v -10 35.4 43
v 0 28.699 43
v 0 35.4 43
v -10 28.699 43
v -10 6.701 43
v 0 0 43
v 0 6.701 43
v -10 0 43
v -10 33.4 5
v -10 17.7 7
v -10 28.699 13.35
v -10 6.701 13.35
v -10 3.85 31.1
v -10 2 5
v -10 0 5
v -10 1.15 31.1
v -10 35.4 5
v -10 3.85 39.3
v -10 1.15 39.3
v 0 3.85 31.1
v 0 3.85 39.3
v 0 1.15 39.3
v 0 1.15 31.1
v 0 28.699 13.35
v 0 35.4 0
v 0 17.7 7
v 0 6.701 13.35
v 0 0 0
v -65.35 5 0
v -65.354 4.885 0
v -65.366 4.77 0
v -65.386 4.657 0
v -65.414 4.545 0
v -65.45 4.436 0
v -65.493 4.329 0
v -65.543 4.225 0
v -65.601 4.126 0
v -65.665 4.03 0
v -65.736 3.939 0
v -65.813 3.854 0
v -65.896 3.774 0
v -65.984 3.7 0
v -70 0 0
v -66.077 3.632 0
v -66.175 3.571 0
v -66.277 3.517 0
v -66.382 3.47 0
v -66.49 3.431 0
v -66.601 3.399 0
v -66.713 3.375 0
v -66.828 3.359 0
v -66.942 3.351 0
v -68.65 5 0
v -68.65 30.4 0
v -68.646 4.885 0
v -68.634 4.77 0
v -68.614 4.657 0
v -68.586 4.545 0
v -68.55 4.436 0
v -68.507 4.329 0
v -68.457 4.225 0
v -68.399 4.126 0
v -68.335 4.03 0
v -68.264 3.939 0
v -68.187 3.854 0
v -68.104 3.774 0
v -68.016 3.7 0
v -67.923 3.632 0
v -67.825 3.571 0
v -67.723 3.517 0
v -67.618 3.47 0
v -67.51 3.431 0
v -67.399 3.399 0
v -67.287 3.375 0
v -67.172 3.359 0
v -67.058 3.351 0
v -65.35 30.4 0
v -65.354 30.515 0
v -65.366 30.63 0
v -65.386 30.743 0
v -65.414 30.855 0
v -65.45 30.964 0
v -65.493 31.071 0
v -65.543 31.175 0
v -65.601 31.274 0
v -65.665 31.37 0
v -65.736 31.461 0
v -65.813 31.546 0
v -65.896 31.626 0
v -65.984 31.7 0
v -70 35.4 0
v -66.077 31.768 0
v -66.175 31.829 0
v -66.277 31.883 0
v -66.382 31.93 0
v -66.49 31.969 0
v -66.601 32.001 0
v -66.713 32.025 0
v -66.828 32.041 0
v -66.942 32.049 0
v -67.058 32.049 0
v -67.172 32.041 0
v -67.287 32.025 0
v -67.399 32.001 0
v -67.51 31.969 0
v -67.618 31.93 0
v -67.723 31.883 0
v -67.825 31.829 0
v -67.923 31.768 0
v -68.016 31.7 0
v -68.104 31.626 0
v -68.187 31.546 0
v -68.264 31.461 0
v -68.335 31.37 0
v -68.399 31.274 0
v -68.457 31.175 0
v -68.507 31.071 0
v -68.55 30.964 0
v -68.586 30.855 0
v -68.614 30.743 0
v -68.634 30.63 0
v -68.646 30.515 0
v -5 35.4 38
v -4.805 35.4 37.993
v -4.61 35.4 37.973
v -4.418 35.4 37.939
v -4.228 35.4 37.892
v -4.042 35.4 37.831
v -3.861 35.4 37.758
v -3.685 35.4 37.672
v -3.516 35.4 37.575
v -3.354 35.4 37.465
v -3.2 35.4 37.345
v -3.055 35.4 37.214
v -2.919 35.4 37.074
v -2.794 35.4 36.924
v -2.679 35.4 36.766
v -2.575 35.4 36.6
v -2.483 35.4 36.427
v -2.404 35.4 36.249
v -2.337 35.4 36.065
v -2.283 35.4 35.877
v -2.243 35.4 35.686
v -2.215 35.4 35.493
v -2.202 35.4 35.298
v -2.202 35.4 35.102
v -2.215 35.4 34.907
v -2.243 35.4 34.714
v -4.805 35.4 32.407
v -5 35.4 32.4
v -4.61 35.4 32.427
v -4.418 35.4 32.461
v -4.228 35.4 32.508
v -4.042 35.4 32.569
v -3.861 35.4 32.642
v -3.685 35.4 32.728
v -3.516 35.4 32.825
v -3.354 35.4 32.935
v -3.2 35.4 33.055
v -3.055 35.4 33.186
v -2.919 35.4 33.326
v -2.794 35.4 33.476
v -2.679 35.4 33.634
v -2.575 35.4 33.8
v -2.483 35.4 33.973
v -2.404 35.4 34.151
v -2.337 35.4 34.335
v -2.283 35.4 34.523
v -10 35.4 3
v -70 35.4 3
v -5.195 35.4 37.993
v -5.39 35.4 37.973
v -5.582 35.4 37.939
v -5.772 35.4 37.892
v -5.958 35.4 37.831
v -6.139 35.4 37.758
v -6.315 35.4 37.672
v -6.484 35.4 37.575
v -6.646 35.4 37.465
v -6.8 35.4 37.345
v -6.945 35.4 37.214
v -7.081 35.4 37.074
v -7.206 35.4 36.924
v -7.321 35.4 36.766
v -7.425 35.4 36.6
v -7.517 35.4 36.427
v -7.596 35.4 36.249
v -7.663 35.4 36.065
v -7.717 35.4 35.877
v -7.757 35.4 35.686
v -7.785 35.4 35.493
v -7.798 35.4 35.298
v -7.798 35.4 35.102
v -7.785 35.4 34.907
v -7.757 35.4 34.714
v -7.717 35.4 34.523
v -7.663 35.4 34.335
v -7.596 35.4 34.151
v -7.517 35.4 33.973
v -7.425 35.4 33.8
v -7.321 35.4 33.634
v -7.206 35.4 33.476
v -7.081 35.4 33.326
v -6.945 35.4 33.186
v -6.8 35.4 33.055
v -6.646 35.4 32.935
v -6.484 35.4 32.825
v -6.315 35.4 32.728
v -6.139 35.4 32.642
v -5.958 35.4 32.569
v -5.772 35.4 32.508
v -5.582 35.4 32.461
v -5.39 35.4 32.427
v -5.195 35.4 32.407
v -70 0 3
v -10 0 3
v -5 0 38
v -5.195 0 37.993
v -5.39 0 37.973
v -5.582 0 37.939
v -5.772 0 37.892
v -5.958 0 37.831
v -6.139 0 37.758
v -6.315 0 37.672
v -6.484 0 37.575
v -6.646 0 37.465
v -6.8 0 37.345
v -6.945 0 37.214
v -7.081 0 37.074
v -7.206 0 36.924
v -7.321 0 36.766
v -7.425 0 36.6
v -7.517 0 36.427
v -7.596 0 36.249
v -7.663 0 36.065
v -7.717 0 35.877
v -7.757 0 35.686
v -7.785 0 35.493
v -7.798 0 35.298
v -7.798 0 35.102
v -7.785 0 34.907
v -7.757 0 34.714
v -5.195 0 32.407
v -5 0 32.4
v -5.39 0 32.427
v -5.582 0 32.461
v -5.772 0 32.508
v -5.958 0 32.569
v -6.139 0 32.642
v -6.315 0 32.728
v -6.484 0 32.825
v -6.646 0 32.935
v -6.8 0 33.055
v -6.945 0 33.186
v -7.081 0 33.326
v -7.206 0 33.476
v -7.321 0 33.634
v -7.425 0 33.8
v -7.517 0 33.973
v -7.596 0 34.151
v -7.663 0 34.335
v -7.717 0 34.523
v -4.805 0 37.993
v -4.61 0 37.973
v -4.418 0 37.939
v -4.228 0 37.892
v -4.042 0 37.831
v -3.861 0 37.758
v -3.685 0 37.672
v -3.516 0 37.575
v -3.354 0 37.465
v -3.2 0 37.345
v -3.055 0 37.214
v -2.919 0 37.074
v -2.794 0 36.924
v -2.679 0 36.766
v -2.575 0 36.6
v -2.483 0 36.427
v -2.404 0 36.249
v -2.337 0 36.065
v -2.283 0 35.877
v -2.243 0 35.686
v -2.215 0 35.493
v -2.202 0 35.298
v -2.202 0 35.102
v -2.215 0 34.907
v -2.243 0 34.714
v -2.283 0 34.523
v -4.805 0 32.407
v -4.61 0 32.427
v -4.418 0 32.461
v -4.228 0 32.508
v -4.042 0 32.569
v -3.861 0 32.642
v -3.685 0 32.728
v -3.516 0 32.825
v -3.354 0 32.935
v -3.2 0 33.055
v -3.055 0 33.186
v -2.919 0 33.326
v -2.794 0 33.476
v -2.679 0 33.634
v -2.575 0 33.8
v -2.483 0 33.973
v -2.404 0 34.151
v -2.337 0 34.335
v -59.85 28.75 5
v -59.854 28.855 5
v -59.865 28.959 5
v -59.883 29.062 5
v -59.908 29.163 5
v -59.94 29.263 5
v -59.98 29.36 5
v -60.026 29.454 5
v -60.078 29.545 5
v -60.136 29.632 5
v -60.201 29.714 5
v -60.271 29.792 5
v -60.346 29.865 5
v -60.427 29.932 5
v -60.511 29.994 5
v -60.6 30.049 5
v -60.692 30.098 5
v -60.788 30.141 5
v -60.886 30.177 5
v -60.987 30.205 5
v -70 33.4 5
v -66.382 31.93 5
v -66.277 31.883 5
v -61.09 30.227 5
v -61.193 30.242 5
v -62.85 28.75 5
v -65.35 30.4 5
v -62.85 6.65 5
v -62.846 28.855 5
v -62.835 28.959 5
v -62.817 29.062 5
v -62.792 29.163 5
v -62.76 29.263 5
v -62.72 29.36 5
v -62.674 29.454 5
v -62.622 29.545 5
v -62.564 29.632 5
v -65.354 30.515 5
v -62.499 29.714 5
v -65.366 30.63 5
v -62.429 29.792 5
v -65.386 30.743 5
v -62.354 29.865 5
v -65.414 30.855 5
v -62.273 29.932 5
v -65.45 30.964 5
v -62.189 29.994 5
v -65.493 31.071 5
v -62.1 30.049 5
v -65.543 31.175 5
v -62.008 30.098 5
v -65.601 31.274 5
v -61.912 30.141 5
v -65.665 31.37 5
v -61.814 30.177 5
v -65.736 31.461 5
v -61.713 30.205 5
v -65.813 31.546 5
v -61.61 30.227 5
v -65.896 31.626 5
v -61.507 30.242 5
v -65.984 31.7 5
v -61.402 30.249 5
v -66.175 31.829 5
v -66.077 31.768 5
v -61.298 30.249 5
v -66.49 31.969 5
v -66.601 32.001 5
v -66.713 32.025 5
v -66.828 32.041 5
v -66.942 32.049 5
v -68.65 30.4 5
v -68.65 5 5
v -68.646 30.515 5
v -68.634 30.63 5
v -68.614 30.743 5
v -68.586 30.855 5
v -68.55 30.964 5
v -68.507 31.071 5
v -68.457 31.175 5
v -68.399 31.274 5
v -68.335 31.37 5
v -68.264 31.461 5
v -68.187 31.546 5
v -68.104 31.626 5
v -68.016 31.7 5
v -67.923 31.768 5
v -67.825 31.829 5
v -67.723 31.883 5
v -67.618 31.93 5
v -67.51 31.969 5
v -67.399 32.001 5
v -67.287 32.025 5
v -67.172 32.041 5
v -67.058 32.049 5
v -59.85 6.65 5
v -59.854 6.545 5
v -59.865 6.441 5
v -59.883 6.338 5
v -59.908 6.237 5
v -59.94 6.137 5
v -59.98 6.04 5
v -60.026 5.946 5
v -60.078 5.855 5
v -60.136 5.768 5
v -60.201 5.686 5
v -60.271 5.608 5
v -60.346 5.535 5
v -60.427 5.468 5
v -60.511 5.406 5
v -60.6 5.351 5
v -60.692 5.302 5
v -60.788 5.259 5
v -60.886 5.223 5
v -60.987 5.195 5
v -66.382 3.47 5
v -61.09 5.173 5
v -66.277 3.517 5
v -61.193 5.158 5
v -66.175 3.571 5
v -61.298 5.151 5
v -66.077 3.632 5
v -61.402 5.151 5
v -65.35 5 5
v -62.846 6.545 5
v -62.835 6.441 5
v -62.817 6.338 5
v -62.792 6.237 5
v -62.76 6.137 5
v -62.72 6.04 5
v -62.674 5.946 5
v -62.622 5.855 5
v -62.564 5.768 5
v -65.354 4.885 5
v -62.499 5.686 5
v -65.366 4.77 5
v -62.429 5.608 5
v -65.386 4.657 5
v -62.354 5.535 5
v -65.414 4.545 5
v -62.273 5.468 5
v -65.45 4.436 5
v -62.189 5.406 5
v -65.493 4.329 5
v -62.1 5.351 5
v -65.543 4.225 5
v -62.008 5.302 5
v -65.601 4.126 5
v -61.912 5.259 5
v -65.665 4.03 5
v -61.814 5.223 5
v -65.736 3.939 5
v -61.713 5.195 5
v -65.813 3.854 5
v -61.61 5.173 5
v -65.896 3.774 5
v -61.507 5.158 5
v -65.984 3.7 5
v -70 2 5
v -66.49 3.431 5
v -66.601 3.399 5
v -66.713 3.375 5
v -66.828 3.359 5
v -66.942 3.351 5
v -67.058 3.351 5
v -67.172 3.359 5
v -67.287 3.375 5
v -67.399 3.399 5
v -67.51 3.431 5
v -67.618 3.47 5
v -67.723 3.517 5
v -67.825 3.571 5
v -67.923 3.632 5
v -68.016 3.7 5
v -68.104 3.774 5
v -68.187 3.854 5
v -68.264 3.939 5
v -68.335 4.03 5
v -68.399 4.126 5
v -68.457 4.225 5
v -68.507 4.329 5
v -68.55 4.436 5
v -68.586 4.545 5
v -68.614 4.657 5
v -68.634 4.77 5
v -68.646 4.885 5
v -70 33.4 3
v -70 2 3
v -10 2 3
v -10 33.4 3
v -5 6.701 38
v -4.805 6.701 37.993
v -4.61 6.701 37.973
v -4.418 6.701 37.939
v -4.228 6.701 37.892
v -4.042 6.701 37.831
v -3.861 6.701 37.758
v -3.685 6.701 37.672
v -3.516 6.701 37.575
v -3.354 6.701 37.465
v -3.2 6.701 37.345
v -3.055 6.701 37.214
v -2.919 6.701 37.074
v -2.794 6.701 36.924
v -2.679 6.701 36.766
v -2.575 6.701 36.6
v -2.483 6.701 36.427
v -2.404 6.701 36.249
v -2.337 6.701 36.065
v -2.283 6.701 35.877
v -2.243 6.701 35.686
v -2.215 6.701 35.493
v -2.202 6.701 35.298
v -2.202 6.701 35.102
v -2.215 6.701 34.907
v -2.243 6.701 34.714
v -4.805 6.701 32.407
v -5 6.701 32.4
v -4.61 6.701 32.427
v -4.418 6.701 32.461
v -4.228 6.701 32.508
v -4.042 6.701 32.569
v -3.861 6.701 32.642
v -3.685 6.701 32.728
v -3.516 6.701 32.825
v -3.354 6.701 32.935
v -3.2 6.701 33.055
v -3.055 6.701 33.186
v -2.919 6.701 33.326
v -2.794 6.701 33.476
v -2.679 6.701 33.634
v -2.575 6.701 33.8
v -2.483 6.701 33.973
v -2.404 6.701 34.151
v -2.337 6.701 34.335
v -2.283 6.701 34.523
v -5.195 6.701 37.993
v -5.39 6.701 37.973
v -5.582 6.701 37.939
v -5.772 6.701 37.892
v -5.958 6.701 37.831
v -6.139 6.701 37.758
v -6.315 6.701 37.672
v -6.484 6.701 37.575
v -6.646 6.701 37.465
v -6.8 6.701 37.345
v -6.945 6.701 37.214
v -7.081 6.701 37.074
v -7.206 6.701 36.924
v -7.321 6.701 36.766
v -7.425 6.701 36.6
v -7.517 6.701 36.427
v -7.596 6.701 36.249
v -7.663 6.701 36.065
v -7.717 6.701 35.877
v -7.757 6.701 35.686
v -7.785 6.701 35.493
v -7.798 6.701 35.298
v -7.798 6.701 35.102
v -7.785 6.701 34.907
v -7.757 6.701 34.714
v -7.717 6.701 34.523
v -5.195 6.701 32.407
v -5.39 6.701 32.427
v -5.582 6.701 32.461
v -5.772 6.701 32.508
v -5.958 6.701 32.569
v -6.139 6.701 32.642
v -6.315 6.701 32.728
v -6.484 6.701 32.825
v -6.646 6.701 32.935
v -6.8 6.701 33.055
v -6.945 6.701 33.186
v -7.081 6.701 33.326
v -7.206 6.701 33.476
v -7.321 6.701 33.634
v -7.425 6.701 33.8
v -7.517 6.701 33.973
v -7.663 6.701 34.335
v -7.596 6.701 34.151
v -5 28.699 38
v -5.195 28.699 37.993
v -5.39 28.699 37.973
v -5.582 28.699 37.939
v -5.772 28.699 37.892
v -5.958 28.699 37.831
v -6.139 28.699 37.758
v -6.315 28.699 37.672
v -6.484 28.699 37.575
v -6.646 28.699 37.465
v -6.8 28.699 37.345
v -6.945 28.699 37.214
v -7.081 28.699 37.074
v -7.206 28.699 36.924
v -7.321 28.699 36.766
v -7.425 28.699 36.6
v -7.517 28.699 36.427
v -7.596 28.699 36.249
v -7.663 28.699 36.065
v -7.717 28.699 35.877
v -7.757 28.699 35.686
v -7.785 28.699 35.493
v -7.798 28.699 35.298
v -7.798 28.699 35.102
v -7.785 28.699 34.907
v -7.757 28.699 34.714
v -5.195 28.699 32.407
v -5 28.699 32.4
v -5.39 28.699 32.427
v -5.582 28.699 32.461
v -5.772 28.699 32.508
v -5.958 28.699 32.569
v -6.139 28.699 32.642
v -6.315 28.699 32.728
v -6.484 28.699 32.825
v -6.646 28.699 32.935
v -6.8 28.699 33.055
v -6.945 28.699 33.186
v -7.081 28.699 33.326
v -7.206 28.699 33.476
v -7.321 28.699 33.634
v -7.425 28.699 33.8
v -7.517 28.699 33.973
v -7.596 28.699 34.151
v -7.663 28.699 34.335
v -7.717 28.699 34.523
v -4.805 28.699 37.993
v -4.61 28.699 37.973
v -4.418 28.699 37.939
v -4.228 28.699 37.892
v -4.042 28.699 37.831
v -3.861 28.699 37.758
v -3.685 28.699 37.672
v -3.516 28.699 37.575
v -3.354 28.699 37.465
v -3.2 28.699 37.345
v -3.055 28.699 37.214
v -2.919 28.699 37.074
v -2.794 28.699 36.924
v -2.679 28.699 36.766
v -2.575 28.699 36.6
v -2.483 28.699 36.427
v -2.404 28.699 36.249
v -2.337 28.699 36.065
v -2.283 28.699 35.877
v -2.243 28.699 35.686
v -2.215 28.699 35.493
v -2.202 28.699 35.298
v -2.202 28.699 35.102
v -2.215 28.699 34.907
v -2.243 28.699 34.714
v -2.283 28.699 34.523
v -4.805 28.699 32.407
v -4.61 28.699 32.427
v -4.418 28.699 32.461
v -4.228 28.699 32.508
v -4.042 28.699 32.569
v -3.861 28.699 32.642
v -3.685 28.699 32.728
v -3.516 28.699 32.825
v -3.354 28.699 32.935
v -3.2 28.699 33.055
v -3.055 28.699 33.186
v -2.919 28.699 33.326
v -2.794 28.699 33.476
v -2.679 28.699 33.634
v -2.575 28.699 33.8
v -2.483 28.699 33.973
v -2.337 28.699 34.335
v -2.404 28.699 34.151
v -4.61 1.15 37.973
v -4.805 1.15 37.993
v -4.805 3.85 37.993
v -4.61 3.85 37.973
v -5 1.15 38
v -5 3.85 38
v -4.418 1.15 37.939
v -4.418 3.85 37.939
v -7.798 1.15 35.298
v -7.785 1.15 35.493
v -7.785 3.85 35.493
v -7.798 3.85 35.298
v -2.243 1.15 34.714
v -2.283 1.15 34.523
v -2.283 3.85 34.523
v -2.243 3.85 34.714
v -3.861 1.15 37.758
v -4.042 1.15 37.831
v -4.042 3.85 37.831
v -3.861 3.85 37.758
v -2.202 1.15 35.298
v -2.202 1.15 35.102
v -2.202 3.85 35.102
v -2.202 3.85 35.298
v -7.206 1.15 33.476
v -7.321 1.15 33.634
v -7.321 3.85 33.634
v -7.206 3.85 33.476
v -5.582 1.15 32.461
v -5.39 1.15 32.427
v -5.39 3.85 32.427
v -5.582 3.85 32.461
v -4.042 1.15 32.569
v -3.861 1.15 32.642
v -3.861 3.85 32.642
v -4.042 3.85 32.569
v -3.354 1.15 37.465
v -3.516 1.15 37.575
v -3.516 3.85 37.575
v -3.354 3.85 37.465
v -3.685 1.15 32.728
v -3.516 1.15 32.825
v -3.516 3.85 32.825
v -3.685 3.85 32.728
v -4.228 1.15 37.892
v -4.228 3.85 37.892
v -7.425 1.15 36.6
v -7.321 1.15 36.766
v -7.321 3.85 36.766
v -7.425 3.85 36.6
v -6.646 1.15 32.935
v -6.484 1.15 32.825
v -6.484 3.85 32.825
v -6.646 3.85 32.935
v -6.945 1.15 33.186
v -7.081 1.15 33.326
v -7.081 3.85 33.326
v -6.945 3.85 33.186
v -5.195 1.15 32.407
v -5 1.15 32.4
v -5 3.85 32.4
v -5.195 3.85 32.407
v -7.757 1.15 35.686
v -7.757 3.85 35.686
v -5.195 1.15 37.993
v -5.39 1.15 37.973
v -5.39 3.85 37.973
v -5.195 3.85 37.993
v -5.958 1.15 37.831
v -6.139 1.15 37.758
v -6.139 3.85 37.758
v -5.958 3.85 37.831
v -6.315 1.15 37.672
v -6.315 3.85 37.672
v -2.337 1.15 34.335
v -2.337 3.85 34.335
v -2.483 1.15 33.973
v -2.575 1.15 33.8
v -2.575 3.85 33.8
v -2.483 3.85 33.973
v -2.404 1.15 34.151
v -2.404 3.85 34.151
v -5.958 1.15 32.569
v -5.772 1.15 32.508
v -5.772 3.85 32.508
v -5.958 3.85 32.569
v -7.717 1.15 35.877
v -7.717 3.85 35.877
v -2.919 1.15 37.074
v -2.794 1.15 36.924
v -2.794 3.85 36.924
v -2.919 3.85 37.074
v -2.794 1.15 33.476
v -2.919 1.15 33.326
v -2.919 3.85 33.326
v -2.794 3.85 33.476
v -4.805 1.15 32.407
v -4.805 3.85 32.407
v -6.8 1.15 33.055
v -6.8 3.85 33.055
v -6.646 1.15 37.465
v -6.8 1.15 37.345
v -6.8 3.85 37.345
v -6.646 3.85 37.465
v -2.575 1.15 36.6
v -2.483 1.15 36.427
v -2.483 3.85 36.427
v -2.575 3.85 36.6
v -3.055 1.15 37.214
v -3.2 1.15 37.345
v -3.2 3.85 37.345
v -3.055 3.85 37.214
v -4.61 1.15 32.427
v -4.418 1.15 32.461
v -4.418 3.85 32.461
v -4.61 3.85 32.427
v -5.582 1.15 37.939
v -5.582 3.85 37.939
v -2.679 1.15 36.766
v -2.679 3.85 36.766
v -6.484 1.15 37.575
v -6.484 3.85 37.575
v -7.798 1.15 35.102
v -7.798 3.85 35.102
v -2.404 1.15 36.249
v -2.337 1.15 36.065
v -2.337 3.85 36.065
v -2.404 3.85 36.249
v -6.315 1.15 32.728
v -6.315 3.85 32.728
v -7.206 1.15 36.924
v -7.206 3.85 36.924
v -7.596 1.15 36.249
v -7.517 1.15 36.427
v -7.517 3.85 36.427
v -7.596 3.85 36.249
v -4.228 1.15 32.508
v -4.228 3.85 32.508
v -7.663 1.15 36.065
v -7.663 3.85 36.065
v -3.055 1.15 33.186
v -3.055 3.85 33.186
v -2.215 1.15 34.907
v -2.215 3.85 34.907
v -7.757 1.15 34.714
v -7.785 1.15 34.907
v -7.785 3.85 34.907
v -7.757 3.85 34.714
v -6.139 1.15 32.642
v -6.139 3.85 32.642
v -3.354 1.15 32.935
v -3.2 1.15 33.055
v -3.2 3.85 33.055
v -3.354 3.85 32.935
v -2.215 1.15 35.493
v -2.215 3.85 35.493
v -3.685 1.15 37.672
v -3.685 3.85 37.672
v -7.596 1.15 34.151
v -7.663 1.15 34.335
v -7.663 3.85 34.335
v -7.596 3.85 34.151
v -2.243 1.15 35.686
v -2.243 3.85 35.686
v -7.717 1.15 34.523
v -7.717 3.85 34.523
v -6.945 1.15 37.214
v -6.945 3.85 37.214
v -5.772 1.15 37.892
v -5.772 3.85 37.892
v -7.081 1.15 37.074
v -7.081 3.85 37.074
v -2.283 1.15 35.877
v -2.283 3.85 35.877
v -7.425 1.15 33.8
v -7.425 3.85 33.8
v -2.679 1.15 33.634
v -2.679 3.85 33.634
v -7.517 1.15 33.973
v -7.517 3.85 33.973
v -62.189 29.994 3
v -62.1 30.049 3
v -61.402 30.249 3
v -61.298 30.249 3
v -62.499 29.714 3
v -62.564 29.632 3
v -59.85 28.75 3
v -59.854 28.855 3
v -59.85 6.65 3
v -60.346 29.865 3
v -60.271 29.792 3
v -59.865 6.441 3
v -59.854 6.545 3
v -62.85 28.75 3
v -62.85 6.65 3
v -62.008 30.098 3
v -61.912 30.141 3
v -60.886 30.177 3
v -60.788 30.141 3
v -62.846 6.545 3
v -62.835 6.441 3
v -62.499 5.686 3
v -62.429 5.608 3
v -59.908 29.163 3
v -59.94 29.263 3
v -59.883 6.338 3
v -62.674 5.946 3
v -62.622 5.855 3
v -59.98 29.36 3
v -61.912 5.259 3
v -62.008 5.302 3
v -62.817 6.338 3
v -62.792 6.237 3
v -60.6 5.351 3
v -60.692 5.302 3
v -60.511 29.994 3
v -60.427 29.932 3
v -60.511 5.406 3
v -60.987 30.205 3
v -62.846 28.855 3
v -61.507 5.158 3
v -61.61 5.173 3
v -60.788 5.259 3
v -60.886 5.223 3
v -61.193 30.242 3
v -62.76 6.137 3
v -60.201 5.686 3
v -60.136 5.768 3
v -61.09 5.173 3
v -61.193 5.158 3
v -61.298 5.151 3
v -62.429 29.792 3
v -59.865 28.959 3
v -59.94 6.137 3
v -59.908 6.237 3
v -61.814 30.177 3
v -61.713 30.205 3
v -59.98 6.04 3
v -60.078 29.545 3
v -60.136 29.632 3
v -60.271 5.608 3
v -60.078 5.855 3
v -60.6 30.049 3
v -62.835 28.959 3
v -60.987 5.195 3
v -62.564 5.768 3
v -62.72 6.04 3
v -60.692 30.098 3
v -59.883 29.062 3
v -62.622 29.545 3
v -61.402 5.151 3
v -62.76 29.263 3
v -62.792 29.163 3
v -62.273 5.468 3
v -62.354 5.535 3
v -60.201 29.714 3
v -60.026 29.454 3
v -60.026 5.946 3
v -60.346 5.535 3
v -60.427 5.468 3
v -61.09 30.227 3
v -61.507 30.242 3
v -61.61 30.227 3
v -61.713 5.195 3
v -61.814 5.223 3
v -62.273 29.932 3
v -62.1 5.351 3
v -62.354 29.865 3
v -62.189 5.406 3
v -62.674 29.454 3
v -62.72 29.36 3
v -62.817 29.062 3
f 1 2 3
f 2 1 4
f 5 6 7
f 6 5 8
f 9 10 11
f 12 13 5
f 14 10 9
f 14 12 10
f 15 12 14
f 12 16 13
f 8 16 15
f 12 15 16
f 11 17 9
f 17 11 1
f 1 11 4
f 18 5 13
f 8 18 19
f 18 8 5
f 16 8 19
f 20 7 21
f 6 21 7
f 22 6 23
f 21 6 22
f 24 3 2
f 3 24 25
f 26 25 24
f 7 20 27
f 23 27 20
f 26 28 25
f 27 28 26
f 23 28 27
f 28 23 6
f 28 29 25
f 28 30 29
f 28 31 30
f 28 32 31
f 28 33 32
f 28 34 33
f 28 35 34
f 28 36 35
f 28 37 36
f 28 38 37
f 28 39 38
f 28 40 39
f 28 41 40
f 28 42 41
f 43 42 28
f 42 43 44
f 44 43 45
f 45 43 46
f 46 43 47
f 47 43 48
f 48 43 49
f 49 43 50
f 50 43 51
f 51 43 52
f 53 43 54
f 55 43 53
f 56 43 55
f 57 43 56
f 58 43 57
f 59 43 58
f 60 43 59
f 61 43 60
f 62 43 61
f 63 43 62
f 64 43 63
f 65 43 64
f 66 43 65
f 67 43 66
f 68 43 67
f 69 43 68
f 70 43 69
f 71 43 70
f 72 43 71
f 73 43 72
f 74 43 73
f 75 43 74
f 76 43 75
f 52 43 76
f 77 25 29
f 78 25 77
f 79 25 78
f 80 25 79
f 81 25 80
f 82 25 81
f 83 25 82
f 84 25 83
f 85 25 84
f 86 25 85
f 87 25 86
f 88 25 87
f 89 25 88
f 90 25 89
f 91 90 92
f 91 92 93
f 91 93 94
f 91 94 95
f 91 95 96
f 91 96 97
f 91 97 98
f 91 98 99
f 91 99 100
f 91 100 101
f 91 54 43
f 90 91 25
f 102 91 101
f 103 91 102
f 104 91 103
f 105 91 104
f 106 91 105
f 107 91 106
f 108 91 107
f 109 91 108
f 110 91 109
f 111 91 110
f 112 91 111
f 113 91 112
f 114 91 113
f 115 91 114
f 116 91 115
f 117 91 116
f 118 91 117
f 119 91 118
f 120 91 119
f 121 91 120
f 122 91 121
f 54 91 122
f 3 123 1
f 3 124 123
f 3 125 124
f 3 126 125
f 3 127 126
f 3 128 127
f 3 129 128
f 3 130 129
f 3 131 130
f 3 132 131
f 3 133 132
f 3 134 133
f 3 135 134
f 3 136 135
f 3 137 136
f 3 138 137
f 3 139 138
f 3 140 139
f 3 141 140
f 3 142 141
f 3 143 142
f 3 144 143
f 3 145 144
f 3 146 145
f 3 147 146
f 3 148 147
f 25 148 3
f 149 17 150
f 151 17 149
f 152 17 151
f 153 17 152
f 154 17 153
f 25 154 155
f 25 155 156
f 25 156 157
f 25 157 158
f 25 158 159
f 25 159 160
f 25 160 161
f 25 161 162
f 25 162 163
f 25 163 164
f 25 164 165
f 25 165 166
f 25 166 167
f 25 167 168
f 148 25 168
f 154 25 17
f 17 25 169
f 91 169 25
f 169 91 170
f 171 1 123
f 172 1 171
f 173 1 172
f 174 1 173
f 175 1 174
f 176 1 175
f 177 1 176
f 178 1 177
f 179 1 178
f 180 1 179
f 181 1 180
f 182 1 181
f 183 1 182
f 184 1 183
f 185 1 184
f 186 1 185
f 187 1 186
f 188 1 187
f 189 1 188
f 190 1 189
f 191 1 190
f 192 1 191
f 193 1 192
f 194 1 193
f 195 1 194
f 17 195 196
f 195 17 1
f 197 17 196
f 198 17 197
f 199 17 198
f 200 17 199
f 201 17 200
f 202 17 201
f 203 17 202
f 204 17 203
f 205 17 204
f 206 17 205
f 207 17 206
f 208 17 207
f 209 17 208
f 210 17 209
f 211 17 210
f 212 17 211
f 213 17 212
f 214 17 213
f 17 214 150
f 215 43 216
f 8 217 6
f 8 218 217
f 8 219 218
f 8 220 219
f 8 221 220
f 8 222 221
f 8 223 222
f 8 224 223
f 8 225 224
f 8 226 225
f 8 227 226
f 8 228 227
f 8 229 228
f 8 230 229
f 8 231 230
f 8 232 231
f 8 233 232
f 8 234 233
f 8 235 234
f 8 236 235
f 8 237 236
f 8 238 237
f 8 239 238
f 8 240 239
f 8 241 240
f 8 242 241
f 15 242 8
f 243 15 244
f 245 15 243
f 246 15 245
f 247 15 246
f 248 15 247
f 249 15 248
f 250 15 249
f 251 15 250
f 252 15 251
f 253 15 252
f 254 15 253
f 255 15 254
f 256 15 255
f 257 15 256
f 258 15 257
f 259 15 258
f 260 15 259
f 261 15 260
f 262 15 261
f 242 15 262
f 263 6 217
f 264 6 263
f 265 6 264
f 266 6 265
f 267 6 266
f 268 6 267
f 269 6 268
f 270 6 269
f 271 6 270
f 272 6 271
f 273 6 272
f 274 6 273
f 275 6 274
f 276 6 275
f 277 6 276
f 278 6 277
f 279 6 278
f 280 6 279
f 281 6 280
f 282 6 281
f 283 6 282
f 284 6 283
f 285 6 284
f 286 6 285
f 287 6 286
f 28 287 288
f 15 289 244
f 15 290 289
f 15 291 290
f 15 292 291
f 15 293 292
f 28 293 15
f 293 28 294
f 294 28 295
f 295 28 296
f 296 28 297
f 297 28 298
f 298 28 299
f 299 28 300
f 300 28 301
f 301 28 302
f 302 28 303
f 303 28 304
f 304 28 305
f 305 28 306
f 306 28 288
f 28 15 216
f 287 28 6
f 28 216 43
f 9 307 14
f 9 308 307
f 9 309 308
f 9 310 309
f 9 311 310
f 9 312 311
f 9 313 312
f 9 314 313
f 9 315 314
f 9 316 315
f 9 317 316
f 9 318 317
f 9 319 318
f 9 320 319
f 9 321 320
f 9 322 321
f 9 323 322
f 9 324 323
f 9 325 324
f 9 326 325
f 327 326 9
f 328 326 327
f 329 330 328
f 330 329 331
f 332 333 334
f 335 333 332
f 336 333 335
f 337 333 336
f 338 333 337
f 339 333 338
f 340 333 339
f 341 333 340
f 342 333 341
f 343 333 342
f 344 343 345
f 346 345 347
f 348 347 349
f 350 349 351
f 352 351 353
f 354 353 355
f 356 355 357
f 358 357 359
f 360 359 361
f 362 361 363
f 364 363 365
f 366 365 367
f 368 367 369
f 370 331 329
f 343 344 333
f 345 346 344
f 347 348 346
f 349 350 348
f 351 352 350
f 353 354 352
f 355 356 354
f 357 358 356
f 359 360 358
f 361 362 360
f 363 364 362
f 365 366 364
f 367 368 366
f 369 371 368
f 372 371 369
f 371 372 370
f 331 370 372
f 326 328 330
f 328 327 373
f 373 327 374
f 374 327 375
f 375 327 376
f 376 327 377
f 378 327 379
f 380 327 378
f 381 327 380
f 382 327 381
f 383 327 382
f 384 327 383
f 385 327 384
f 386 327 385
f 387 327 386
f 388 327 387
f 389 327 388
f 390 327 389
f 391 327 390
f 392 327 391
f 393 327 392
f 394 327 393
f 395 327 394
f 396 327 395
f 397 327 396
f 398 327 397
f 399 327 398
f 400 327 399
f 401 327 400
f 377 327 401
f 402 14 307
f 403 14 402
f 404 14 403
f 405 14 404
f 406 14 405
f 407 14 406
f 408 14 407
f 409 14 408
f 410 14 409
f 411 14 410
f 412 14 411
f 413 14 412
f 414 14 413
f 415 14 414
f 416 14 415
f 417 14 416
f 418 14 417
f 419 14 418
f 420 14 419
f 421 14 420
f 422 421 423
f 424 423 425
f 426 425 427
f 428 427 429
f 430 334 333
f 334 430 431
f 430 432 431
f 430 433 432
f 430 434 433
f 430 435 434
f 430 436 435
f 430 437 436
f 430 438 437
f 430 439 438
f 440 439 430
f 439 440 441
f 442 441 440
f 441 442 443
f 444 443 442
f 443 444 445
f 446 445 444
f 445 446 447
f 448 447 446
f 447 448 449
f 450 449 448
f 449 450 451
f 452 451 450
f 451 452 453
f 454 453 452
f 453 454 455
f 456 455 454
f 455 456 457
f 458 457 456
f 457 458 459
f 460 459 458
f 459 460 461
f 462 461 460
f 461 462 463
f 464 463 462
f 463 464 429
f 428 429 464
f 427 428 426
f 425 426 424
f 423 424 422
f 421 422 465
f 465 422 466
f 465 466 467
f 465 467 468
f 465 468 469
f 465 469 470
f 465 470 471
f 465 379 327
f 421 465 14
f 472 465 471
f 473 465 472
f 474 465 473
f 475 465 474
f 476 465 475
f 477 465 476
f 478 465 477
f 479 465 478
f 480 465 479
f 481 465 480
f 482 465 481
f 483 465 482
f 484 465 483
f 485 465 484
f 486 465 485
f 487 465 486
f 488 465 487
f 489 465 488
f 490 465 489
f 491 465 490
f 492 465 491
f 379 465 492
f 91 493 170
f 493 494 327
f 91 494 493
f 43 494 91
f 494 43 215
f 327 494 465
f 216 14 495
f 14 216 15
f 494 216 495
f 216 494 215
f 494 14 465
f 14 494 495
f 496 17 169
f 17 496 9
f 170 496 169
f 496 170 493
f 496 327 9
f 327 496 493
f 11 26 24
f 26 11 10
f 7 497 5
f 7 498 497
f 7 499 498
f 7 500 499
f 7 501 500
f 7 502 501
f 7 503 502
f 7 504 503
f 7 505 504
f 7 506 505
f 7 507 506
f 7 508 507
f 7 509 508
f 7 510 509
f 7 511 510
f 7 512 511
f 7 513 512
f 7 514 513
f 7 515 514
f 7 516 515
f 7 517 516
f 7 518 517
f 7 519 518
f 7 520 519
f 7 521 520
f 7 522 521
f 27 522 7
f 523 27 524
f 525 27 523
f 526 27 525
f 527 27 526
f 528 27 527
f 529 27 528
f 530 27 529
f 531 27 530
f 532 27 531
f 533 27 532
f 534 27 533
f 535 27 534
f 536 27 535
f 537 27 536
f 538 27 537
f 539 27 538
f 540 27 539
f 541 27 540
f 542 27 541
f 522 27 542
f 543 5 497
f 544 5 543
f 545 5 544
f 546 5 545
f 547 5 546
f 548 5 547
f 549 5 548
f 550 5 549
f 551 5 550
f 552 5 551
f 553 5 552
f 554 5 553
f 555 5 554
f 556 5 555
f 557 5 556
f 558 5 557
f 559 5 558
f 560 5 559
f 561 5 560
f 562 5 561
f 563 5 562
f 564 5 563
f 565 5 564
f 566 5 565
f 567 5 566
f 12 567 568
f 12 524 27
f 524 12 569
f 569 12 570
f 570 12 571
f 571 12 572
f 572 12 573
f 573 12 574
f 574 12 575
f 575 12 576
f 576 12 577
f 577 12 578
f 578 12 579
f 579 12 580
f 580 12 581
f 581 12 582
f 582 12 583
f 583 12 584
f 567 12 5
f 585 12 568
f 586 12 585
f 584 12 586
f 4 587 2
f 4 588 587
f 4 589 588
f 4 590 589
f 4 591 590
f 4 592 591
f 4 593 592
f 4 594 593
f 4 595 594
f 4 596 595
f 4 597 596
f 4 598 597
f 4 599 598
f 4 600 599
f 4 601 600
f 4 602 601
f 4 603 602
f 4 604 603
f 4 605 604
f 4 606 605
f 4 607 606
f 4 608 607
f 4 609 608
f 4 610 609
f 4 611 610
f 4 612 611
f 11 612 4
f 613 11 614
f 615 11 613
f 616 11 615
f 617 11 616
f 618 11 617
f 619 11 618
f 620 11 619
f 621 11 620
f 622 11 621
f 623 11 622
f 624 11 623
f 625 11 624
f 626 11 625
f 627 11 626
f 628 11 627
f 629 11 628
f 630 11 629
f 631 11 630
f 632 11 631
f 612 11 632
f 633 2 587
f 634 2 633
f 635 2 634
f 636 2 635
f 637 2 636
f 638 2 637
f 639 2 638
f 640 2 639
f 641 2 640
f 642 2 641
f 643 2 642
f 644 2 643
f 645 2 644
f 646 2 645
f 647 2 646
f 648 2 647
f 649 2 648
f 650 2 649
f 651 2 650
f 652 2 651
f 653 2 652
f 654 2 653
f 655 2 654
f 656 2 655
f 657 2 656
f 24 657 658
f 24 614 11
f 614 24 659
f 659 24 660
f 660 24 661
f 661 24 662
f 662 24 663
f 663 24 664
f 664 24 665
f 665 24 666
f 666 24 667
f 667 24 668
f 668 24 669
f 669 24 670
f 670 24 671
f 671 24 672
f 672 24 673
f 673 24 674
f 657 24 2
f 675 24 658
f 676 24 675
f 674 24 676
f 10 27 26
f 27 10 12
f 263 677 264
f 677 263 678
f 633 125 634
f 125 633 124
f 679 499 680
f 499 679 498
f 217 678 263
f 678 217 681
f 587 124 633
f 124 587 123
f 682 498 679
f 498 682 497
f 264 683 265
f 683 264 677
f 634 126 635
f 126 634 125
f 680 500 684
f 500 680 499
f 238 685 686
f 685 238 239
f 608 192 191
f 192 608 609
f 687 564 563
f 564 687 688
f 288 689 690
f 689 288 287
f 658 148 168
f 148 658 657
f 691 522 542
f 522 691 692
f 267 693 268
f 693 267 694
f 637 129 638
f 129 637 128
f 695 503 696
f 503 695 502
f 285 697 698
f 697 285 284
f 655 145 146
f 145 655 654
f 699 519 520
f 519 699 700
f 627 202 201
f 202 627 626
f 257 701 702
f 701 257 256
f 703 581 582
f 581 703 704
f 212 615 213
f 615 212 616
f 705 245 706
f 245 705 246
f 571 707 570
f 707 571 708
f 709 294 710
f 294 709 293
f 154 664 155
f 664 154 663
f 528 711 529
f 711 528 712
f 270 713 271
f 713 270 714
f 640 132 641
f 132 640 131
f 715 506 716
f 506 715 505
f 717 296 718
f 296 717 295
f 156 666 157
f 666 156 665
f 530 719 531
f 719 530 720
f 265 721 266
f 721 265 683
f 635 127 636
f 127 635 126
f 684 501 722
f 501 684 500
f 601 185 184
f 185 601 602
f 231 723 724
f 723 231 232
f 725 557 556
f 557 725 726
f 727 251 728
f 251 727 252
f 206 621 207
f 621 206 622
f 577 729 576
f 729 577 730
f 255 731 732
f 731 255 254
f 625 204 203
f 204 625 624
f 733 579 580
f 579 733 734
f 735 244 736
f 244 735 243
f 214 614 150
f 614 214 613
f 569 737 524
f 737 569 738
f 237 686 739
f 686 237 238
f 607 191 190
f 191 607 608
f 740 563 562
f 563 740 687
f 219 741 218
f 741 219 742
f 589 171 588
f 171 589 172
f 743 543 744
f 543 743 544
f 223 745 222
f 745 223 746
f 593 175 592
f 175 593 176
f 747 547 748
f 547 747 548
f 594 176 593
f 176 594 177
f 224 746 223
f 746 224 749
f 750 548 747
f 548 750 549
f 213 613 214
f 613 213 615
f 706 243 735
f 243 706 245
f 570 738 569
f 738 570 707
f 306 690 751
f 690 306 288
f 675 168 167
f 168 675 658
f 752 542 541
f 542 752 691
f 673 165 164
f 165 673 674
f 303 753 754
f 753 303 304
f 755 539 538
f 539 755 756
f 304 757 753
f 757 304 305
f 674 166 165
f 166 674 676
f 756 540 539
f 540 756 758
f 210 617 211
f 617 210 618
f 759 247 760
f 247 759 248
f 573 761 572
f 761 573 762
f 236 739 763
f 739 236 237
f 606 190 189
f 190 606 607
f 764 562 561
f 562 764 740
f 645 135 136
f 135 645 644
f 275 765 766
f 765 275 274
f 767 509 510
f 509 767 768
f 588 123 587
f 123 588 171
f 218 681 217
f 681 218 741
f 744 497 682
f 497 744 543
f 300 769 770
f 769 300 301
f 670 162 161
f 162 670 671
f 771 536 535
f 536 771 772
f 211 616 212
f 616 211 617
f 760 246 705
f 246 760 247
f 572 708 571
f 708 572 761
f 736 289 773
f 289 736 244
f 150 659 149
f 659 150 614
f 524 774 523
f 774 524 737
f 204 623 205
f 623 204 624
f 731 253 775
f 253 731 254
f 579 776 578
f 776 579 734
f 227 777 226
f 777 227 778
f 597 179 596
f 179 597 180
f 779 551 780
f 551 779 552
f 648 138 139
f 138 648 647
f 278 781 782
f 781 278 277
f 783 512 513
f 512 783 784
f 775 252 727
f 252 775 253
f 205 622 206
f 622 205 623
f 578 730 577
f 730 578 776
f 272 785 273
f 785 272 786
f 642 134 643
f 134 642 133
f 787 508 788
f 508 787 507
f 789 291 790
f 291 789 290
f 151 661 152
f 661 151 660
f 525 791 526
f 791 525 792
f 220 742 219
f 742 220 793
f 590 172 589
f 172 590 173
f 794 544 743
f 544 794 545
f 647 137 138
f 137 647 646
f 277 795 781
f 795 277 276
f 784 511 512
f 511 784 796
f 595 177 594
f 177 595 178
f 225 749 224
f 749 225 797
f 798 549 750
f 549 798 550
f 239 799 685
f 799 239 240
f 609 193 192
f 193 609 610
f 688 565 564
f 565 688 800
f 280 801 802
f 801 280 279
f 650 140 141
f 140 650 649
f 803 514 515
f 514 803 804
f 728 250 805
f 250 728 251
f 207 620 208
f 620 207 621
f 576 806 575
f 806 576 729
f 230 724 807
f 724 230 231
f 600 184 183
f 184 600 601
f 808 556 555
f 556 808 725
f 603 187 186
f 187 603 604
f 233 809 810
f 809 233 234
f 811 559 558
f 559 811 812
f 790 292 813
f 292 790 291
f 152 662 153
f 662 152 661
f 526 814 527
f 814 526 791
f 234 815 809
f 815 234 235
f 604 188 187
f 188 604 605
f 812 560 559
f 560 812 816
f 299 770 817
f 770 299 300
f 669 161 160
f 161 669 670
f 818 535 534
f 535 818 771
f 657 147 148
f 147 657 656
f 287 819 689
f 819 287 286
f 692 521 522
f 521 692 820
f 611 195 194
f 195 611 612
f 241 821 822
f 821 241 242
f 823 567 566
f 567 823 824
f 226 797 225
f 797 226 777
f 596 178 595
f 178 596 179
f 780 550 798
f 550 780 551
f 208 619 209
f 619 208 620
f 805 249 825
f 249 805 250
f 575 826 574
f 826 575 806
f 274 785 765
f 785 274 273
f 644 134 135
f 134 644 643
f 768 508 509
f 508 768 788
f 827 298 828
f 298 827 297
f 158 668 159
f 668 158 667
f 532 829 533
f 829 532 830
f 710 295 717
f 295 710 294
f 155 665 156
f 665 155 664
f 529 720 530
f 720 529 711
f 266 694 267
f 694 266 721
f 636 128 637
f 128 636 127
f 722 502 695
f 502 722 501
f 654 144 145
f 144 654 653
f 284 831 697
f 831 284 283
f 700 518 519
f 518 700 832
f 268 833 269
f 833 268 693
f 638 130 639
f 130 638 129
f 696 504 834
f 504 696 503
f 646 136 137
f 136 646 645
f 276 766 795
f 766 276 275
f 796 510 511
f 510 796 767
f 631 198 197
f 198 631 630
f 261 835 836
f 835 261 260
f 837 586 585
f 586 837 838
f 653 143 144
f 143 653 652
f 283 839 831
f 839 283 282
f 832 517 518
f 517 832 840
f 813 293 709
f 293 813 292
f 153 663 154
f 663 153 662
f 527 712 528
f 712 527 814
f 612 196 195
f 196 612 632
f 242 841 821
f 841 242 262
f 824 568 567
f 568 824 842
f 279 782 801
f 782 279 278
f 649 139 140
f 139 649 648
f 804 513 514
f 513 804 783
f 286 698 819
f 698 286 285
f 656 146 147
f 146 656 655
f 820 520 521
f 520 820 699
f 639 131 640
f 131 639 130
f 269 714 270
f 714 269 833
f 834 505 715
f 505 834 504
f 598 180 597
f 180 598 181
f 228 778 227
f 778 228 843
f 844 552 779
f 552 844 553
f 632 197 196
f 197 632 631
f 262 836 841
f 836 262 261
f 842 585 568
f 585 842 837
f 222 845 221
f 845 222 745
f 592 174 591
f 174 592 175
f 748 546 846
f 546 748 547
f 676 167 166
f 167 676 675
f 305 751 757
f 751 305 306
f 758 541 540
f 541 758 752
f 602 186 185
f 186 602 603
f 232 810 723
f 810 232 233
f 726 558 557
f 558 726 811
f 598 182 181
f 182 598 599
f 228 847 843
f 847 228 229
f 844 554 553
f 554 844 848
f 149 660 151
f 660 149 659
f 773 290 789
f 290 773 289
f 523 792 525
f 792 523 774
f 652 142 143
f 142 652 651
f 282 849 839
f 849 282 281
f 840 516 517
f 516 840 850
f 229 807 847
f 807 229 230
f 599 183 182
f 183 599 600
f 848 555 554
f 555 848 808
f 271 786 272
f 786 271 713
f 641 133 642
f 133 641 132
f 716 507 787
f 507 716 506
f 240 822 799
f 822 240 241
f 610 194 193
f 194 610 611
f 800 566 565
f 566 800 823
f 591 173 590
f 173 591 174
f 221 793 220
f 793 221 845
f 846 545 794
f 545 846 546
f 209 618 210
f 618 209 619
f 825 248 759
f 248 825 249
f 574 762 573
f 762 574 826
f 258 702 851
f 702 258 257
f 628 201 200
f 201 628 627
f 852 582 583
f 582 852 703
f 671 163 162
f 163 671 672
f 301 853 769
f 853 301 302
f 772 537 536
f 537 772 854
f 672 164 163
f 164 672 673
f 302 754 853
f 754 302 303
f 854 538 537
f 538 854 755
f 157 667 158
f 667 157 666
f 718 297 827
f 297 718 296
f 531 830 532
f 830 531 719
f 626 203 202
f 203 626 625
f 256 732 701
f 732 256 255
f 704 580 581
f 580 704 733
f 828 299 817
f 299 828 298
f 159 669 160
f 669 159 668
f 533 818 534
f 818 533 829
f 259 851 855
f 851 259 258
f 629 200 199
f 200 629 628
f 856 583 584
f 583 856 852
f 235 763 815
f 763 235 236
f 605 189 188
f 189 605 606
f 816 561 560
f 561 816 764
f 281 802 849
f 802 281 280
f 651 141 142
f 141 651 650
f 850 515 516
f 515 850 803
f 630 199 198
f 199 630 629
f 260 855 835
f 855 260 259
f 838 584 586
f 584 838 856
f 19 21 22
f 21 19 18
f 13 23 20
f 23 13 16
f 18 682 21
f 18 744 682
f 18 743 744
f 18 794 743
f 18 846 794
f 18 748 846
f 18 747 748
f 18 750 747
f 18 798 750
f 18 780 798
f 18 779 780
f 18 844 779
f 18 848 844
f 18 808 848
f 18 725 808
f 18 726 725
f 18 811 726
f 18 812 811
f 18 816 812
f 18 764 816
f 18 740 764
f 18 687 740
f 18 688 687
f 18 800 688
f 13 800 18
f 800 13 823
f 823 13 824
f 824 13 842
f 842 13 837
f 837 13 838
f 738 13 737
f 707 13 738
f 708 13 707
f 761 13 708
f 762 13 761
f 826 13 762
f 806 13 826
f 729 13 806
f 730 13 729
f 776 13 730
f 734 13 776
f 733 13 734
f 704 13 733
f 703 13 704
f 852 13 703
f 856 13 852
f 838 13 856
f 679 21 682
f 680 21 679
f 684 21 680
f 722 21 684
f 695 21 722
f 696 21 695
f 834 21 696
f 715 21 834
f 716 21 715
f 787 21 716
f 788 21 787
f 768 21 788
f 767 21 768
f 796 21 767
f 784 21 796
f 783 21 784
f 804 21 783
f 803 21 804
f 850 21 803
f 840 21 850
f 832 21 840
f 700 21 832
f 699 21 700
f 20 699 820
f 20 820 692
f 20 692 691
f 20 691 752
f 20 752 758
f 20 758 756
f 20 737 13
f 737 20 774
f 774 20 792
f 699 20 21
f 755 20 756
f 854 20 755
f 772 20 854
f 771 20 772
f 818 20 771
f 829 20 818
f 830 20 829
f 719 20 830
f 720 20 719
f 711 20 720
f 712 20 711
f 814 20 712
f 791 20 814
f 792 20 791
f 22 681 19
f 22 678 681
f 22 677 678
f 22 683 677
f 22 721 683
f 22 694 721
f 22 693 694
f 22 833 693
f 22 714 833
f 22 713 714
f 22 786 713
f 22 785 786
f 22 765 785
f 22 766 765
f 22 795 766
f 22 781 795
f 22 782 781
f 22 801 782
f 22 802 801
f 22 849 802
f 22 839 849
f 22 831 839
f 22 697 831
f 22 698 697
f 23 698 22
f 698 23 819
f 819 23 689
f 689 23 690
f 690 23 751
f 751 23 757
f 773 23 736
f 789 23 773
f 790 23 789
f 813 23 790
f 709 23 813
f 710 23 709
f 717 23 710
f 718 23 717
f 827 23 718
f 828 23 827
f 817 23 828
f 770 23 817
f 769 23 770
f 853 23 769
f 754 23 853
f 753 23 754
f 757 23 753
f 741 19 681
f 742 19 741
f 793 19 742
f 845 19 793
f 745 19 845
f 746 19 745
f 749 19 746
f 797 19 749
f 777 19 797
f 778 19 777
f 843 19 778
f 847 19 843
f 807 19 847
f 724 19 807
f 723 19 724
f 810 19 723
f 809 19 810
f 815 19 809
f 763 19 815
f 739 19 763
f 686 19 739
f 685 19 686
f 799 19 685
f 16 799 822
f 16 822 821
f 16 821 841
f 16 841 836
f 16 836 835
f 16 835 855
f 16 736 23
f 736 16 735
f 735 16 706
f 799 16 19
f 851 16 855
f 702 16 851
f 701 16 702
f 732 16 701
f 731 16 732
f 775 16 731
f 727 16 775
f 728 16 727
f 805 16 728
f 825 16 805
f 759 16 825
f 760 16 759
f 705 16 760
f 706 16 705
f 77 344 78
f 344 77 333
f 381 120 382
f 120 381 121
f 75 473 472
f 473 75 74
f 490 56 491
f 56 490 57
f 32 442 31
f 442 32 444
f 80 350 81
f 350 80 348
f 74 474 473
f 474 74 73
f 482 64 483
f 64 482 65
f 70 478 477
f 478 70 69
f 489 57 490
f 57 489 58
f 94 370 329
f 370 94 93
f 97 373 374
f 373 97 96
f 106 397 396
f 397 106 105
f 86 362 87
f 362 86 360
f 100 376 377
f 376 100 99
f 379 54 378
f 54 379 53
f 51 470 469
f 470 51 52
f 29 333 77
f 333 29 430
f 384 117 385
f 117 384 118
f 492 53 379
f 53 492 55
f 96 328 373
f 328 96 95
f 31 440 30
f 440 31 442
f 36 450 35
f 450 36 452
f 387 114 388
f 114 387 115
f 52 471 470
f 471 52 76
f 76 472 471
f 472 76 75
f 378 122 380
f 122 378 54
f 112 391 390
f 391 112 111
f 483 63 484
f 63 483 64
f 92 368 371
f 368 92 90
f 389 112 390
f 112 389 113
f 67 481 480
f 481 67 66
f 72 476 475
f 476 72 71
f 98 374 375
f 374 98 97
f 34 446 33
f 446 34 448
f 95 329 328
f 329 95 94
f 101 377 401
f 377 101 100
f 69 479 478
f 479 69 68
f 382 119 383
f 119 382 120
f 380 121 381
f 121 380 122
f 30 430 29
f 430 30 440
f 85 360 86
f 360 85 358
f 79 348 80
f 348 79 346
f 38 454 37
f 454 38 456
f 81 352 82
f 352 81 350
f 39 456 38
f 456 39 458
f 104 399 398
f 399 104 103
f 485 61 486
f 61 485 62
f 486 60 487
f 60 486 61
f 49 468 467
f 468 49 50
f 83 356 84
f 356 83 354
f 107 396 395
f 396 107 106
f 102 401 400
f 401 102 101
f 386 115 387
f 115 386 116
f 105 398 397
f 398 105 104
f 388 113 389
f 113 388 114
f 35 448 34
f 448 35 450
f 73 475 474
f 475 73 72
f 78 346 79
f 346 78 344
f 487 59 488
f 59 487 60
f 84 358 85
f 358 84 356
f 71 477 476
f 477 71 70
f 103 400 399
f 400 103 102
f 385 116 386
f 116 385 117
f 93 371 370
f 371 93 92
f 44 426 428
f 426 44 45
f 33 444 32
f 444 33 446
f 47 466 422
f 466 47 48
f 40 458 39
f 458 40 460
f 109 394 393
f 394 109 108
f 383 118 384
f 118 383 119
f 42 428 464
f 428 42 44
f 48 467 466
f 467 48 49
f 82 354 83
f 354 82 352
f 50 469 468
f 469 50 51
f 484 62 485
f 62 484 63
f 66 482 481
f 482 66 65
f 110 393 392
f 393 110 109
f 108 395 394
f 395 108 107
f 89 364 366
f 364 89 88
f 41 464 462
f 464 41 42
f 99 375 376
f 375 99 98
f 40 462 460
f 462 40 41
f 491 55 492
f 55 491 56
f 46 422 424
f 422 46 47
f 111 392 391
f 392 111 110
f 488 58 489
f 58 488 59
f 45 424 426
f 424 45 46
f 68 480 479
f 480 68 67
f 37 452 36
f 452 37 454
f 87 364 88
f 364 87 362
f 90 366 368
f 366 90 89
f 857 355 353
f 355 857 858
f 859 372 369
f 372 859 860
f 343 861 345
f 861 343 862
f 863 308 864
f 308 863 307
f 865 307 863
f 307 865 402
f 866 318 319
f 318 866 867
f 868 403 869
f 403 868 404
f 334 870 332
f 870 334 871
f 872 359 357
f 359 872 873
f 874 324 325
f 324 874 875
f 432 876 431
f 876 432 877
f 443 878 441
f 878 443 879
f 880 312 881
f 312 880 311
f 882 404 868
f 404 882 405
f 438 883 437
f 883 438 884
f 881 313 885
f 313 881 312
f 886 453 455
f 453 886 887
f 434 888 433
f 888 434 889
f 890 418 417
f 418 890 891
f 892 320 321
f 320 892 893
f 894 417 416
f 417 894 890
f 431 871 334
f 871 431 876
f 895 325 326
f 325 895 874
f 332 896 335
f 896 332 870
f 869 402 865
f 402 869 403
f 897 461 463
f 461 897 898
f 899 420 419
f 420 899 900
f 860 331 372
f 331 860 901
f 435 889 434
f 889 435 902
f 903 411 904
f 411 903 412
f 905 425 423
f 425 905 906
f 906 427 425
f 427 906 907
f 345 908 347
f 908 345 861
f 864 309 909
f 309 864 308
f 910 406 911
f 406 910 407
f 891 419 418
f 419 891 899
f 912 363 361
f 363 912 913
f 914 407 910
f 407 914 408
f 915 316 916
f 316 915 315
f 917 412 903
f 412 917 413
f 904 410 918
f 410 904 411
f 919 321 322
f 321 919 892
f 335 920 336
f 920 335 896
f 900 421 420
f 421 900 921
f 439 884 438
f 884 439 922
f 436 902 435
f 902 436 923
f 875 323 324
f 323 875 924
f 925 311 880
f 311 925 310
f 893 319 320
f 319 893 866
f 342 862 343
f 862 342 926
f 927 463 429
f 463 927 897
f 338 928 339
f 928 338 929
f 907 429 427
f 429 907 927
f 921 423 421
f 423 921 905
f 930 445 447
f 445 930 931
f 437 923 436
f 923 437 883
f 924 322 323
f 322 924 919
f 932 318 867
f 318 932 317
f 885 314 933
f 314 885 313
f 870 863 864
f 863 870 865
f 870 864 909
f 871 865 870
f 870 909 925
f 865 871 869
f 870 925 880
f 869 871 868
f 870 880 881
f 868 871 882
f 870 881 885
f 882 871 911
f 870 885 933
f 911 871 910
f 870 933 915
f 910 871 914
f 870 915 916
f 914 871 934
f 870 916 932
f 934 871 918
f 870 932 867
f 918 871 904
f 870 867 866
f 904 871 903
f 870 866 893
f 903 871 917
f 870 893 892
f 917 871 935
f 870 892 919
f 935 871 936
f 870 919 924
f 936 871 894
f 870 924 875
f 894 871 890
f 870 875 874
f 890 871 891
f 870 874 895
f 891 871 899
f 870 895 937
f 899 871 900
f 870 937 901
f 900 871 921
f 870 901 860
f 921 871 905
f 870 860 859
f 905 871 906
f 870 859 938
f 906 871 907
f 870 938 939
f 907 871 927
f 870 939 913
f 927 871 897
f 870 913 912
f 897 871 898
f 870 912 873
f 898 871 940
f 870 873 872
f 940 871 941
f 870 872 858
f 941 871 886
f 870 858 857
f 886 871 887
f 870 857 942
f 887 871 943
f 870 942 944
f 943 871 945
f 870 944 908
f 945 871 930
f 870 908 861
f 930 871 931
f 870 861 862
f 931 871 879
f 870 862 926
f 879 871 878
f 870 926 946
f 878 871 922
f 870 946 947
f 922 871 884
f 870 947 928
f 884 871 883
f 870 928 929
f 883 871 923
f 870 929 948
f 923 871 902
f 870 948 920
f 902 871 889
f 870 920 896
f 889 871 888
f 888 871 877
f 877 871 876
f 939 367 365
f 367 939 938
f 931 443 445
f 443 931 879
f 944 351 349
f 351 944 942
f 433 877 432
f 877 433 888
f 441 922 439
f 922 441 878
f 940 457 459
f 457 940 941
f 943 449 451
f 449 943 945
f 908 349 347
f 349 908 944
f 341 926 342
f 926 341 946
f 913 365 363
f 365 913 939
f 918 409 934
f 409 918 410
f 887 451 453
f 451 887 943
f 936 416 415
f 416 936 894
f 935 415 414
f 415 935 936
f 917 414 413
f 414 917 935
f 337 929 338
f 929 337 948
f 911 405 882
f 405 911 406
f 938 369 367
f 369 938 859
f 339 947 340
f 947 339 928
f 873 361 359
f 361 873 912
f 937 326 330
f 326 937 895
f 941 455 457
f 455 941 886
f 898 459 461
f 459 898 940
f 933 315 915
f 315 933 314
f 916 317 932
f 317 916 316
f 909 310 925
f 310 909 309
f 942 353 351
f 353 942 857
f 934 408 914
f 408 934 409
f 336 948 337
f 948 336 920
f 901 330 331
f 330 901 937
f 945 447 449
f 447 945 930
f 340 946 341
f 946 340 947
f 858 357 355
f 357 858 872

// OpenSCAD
height = 70;
spindlePortionHeight = 10;
coletteHolderClearance = 2;//6;
spindleShaftDiameter = 25.4;//14.5;
holeSpacing = 19;
insetDepth = 2;
insetHeight = 3;
insetOffsetFromHoles = 4;
separation = 1;
m3 = 3.3;
m3NutWidth = 5.7;
m3nutHeight = 2;
wallThickness = 5;
sideCutoff = 3;

m5 = 5.6;
m5NutWidth = 8.2;
m5NutHeight = 2.7;

probeOffset = 3;

sides = 6;

length = 2*wallThickness+max(holeSpacing,spindleShaftDiameter);
rotate([0,-90,0])
difference() {
    union() {
        cube([wallThickness+coletteHolderClearance+spindleShaftDiameter+wallThickness+m5, length,spindlePortionHeight]);
        cube([wallThickness, length,height]);
    }
    hull() {
        translate([wallThickness+coletteHolderClearance+spindleShaftDiameter/2,length/2,0])
            cylinder(r=spindleShaftDiameter/2, h=spindlePortionHeight, $fn=sides);
        translate([wallThickness+coletteHolderClearance+spindleShaftDiameter+wallThickness+m5,length/2,0])
            cylinder(r=spindleShaftDiameter/2, h=spindlePortionHeight, $fn=sides);
    }
    translate([wallThickness+coletteHolderClearance+spindleShaftDiameter+m5/2,0,spindlePortionHeight/2]) rotate([-90,0,0]) {
        cylinder(r=m5/2,h=length,$fn=90);
    }
    translate([wallThickness+coletteHolderClearance+spindleShaftDiameter+m5/2-m5NutWidth/2,(length-spindleShaftDiameter)/4-m5NutHeight/2,0])
        cube([m5NutWidth,m5NutHeight,spindlePortionHeight]);
    hull() {
        translate([0,wallThickness,height-probeOffset]) rotate([0,90,0])
            cylinder(r=m3/2,h=length,$fn=90);
        translate([0,length-wallThickness,height-probeOffset]) rotate([0,90,0])
            cylinder(r=m3/2,h=length,$fn=90);
    }
    hull() {
        translate([wallThickness-insetDepth,wallThickness+m3/2,height-probeOffset-insetOffsetFromHoles-m3/2]) rotate([0,90,0])
            cylinder(r=insetHeight/2,h=insetDepth,$fn=90);
        translate([wallThickness-insetDepth,length-wallThickness-m3/2,height-probeOffset-insetOffsetFromHoles-m3/2]) rotate([0,90,0])
            cylinder(r=insetHeight/2,h=insetDepth,$fn=90);
    }
    
    translate([wallThickness-insetDepth,0,spindlePortionHeight]) {
        cube([insetDepth, wallThickness-sideCutoff,height]);
        translate([0,length-wallThickness+sideCutoff,0])
            cube([insetDepth, wallThickness-sideCutoff,height]);
    }
}
